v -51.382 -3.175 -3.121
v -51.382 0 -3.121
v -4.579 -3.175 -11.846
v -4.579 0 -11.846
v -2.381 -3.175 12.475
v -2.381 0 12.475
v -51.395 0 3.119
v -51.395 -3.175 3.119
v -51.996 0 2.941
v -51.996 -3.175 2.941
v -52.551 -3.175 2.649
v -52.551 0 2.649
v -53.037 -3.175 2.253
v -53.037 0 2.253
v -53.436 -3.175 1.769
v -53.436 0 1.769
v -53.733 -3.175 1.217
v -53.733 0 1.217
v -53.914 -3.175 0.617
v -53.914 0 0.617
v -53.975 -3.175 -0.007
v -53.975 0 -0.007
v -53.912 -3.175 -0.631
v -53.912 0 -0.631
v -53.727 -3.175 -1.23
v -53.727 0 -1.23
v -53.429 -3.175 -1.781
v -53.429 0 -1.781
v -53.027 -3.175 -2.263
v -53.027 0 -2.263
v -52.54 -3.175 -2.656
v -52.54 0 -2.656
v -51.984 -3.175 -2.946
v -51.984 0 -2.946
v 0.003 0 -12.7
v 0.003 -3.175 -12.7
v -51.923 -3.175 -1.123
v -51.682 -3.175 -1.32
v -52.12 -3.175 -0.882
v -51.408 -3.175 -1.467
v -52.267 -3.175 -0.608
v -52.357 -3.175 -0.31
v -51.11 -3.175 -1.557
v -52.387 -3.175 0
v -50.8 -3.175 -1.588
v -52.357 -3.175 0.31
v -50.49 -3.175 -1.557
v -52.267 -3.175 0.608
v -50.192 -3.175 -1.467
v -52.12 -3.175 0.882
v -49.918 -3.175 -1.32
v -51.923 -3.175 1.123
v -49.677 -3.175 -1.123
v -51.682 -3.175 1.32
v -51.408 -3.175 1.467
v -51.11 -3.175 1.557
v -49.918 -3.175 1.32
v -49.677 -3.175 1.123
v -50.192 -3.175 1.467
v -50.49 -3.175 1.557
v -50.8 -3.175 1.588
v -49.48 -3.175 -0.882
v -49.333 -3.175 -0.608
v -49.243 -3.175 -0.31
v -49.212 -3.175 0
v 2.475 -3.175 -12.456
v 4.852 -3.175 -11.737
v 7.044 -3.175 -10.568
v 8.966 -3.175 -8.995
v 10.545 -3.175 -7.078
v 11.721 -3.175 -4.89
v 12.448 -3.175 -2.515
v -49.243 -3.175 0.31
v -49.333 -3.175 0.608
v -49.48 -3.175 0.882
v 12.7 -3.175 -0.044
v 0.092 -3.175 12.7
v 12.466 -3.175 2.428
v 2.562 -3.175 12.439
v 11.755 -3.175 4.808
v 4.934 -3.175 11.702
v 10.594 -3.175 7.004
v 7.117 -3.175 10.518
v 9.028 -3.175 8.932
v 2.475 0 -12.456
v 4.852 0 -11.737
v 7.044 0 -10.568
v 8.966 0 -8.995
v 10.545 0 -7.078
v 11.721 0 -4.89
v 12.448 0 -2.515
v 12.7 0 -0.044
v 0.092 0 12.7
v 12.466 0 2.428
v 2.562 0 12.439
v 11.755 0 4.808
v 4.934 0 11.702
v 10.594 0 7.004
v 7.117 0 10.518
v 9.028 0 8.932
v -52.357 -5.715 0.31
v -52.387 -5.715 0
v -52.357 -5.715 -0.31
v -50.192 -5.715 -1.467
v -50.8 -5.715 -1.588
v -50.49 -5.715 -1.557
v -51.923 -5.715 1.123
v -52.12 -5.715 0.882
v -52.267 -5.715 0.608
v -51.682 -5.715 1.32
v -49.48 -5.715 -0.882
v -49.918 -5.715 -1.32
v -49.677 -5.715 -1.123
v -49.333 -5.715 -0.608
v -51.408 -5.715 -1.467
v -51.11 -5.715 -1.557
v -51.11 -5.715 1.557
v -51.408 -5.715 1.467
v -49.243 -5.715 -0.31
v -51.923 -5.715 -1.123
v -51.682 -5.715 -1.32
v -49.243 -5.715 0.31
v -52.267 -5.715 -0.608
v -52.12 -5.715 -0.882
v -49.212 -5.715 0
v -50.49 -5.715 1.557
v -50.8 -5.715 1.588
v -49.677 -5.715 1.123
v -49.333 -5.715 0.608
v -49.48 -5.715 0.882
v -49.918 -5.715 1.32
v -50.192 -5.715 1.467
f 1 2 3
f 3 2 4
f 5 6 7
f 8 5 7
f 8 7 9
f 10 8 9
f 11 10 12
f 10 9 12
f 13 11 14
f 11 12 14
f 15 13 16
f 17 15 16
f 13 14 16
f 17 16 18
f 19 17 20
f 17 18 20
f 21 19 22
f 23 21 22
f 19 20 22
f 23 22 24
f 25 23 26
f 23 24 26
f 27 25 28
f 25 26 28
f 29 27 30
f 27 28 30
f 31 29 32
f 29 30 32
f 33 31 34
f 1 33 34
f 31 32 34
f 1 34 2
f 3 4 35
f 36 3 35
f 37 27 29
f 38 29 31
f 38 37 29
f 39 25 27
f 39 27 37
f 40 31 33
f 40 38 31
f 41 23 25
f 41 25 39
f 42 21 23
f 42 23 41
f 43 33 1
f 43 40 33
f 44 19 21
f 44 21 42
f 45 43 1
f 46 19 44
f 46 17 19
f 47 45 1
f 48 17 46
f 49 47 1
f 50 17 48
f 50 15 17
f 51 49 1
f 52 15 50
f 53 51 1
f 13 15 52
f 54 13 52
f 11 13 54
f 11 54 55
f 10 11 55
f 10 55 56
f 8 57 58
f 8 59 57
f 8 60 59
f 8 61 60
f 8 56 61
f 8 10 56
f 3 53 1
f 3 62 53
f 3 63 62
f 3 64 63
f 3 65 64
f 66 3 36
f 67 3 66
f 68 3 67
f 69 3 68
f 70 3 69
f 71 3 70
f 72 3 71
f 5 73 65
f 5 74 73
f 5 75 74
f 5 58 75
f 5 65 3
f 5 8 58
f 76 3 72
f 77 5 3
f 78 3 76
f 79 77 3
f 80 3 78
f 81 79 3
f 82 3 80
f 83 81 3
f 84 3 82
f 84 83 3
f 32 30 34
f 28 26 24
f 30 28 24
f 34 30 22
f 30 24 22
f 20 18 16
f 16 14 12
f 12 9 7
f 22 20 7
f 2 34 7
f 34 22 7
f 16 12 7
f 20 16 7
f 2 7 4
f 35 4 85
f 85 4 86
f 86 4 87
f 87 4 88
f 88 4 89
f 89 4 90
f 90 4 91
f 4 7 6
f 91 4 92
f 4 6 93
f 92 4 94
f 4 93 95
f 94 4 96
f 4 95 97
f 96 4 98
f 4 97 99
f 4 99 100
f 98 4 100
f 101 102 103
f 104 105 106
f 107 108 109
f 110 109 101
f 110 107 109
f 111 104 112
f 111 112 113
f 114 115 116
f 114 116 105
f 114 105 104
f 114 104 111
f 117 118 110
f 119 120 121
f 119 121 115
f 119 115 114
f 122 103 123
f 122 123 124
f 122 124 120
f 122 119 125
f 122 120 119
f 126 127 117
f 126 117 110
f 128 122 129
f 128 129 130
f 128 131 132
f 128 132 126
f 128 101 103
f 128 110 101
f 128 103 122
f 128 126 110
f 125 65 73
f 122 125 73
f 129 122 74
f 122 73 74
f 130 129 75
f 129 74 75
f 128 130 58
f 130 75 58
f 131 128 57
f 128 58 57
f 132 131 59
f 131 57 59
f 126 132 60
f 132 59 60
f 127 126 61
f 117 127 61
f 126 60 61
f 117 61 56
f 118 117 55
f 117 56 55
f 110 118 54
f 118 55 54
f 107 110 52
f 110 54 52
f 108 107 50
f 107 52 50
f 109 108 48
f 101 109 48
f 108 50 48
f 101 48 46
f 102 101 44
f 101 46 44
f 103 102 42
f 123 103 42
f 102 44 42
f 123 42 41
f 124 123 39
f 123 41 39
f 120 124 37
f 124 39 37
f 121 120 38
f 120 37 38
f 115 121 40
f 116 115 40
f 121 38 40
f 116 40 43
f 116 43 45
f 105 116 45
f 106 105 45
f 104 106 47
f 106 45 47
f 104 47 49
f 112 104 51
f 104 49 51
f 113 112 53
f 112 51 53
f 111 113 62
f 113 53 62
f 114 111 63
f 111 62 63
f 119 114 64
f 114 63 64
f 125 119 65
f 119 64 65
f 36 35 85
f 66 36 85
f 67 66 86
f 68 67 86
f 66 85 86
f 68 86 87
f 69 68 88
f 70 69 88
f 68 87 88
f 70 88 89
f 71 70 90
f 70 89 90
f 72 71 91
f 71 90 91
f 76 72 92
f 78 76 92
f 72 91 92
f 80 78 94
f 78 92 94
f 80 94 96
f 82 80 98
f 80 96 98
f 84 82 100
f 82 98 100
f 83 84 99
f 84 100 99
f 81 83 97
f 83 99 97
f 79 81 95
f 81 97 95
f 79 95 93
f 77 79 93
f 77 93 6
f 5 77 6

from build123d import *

# Parameters (mm, degrees)
F1_DEPTH = 3.175
F2_R     = 1.5875
F3_DEPTH = 2.54


with BuildPart() as f1:
    # F0 (on Front) → F1 (new body)
    with BuildSketch(Plane.XZ):
        with BuildLine():
            Line((-51.3818325876, -3.121233064), (-4.5789436396, -11.8458125574))
            Line((-4.5789436396, -11.8458125574), (0.0033310249, -12.6999995632))
            ThreePointArc((0.0033310249, -12.6999995632), (12.6434077752, 1.1975975242), (-2.38125, 12.4747604561))
            Line((-2.38125, 12.4747604561), (-51.3953125, 3.118690114))
            ThreePointArc((-51.3953125, 3.118690114), (-53.9749925915, -0.006858838), (-51.3818325876, -3.121233064))
        make_face()
    extrude(amount=F1_DEPTH)

    # F2 (on face) → F3 (join)
    with BuildSketch(Plane.XZ.offset(3.175)):
        with Locations((-50.8, 0)):
            Circle(F2_R)
    extrude(amount=F3_DEPTH)


solid = f1.part
